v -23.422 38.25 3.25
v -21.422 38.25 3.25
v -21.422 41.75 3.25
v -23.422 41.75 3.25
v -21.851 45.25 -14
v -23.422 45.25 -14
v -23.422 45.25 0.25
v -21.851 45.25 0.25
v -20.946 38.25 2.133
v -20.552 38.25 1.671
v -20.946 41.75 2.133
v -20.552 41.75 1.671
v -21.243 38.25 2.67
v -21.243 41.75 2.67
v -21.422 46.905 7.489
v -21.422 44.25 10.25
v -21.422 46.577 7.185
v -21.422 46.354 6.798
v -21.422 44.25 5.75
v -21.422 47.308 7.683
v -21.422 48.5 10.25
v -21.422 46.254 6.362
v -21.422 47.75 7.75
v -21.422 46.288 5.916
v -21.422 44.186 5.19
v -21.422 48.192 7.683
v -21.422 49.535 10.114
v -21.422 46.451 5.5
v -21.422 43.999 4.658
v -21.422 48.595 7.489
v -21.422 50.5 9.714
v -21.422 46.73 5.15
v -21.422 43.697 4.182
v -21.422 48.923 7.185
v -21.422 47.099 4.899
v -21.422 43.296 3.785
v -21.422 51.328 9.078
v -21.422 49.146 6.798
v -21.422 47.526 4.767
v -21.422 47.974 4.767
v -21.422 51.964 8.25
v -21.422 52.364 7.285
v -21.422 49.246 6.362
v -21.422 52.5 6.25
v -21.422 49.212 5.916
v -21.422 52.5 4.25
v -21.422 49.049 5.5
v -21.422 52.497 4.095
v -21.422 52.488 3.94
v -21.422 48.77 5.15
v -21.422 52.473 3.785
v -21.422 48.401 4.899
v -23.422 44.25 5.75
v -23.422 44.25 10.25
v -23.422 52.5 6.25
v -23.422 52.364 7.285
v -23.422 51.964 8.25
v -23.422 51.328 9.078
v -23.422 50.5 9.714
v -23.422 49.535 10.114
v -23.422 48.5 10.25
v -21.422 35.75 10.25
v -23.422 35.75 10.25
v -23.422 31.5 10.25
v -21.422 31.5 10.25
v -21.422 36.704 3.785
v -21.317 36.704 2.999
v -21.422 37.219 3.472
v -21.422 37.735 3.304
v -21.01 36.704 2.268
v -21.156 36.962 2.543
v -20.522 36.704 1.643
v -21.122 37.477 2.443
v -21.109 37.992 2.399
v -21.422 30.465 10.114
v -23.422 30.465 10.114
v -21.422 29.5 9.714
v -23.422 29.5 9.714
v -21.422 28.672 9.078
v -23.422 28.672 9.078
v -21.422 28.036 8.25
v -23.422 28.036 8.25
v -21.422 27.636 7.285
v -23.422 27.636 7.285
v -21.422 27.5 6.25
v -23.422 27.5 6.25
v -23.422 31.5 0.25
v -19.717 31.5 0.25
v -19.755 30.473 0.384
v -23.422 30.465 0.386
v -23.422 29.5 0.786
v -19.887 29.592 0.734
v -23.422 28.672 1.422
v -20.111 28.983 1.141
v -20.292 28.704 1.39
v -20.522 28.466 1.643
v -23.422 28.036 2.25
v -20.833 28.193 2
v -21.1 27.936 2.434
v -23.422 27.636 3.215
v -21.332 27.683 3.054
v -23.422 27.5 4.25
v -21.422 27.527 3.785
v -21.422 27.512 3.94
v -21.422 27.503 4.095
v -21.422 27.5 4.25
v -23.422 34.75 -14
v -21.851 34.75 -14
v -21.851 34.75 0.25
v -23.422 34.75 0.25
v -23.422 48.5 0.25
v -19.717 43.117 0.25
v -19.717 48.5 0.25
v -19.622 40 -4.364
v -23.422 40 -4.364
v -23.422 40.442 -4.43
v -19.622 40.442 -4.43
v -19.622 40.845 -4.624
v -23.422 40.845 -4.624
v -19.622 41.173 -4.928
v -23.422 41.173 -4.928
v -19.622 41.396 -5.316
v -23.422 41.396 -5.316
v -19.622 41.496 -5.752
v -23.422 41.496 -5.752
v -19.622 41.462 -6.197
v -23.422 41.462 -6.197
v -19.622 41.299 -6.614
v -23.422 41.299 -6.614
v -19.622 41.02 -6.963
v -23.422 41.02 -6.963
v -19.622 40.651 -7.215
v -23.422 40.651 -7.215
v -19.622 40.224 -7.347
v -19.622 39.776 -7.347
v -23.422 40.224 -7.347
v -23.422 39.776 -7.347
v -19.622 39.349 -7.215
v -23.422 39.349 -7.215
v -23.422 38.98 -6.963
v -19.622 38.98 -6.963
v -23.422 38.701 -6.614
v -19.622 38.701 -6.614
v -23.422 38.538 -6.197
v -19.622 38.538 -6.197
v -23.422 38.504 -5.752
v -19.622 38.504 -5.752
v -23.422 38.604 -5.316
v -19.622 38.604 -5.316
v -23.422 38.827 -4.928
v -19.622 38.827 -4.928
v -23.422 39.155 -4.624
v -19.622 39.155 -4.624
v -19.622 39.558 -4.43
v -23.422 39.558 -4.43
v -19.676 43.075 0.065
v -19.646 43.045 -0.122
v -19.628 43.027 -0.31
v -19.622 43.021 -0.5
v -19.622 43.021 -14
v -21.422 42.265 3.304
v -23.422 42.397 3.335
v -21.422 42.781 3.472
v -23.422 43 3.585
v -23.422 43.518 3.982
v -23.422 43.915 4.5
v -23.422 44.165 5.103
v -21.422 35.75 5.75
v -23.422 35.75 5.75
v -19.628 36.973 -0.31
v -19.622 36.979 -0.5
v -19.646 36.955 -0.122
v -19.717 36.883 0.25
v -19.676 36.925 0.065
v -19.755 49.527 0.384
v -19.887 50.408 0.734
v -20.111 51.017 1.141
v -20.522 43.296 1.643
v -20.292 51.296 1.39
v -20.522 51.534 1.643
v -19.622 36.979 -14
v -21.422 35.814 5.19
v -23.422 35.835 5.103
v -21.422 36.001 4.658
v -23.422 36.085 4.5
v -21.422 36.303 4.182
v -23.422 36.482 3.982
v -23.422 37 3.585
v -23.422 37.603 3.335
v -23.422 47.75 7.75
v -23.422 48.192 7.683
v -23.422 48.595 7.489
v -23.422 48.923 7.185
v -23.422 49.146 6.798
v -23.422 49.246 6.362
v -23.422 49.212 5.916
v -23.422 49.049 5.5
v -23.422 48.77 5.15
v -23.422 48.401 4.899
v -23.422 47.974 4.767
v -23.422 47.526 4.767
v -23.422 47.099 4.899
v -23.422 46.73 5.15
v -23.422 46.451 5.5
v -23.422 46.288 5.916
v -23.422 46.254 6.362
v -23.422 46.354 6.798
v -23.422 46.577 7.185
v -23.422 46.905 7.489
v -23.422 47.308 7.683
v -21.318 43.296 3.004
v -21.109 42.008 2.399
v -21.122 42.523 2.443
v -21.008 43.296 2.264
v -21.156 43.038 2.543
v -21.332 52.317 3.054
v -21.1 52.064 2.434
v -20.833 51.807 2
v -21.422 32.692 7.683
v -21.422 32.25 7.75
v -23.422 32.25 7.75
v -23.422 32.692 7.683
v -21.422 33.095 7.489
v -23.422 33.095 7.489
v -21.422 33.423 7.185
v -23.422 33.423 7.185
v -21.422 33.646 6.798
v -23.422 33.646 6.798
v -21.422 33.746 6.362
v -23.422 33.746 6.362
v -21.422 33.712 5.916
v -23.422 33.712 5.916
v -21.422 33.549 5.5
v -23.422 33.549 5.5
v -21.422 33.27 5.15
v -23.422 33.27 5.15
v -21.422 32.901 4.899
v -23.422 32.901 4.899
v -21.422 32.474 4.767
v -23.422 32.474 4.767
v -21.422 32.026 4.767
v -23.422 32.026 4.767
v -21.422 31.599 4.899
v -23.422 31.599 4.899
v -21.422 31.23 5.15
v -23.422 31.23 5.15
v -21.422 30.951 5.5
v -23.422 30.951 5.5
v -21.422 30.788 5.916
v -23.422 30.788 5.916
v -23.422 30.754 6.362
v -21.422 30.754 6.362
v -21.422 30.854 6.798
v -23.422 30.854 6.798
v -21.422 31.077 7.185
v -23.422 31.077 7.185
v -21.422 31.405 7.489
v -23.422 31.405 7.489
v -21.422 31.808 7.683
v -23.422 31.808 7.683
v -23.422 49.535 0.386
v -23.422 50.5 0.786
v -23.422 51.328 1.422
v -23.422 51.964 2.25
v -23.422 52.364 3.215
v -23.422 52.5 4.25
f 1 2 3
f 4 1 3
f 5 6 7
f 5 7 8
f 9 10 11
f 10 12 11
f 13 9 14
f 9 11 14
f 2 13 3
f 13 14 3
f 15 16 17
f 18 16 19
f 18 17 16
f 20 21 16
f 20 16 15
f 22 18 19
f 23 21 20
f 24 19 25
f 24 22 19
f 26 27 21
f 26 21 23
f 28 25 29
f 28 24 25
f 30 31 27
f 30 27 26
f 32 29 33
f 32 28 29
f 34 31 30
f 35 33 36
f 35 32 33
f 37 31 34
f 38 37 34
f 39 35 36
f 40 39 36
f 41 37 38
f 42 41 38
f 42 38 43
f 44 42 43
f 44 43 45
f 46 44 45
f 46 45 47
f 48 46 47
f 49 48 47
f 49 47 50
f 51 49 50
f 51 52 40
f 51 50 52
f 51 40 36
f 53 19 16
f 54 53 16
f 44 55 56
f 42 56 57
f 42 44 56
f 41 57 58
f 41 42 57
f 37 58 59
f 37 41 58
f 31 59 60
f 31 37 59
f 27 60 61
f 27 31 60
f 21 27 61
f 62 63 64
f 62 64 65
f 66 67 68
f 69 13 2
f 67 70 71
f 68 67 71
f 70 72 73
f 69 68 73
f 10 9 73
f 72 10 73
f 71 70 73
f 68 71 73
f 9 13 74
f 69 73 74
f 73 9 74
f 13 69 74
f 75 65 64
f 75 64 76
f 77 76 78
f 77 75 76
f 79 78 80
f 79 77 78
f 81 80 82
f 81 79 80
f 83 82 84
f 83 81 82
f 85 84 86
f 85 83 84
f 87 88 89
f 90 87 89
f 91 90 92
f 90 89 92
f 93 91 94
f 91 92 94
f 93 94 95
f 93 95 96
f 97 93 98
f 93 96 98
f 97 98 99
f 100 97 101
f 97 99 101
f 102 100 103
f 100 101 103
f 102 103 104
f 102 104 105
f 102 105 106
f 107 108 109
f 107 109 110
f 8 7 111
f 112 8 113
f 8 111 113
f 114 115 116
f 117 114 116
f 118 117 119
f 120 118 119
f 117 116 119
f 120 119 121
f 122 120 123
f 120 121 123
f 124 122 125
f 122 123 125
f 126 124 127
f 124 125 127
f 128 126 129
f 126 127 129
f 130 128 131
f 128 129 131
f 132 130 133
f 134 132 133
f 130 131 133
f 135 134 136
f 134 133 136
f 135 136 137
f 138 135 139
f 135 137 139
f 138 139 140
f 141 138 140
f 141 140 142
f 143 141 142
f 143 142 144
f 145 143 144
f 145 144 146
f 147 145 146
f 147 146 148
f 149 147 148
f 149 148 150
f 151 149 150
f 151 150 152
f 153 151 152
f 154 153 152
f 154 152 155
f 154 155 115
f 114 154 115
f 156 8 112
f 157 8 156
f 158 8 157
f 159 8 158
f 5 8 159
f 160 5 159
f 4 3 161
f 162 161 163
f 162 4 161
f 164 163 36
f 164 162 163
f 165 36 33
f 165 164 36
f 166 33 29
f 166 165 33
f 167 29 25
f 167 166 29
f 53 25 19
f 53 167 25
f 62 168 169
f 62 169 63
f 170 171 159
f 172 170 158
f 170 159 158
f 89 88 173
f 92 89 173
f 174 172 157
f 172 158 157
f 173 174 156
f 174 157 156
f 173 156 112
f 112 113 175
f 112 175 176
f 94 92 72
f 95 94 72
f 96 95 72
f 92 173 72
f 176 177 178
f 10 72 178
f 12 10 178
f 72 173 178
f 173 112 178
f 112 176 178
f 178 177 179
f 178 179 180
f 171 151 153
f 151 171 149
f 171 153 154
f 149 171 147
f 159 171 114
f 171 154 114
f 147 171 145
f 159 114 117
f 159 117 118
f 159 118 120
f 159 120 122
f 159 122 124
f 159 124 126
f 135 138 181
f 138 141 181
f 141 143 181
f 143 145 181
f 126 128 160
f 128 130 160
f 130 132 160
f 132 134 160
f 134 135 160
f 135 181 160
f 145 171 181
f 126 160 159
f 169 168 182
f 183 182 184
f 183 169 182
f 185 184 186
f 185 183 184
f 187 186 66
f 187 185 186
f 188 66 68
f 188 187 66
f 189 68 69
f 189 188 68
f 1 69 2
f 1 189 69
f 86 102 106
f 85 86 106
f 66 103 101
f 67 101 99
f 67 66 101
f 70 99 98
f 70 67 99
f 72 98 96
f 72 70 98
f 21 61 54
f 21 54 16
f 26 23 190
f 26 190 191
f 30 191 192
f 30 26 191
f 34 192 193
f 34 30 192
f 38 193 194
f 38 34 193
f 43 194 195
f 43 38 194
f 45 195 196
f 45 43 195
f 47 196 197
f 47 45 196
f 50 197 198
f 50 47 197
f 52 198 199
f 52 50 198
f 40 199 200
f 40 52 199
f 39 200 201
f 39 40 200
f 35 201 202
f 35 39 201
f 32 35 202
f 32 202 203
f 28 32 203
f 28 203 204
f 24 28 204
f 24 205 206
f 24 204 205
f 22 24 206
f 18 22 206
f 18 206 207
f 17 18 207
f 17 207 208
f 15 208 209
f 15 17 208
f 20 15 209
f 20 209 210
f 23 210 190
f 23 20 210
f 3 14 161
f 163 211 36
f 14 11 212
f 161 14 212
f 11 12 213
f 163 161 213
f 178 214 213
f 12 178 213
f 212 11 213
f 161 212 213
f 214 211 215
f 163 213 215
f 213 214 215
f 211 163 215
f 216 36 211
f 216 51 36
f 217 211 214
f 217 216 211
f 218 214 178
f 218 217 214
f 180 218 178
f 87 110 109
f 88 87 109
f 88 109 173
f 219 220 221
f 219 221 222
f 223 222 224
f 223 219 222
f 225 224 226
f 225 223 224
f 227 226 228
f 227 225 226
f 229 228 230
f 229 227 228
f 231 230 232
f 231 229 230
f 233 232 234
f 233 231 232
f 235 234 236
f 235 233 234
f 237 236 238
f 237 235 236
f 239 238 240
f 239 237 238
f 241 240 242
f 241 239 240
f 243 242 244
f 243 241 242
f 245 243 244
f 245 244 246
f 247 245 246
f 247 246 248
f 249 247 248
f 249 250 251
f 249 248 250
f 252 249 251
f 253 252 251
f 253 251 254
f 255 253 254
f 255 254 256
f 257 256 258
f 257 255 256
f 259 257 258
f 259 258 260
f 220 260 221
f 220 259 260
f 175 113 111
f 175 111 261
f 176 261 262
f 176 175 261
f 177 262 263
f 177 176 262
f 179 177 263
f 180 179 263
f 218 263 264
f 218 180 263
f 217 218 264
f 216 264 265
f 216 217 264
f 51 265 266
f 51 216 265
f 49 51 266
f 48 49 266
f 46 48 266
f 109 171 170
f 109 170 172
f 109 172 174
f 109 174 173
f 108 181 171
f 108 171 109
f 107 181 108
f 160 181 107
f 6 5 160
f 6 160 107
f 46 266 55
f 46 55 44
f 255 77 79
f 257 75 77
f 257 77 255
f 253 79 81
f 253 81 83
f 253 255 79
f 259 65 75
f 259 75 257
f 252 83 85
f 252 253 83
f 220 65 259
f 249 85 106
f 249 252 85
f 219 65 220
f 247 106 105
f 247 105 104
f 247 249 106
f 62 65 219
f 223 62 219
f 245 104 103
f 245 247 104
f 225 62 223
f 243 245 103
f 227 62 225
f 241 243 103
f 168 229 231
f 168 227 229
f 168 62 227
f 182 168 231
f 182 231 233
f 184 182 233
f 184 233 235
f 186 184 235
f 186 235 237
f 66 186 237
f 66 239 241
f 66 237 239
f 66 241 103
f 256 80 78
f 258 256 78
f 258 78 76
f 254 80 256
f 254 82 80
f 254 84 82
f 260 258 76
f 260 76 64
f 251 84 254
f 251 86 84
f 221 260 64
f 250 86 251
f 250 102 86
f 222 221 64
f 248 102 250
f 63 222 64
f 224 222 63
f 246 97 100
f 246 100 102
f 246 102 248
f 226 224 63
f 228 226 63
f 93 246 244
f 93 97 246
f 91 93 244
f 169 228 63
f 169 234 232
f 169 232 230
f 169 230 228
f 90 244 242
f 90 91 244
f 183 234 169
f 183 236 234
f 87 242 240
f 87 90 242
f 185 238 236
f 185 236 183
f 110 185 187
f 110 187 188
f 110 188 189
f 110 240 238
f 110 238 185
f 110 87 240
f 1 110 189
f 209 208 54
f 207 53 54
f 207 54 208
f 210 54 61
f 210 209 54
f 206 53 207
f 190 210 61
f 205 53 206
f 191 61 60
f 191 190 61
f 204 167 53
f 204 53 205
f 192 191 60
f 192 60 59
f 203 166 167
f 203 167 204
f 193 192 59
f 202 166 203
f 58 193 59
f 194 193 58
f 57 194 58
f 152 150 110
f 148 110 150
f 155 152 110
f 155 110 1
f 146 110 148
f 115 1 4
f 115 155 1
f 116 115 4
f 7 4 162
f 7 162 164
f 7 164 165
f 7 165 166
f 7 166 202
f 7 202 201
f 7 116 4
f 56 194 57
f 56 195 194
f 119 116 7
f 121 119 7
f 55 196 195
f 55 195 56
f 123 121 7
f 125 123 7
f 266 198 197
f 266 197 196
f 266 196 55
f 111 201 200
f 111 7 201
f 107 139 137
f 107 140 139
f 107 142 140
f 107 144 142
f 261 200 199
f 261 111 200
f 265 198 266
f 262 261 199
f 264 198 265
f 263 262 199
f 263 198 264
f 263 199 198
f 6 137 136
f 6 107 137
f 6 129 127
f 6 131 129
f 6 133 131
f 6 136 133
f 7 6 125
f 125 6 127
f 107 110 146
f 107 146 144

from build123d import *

# Parameters (mm, degrees)
BOSS_EXTRUDE1_DEPTH      = 0.25
BOSS_EXTRUDE1_DEPTH_BACK = 14
SKETCH2_R                = 1.5
CUT_EXTRUDE1_DEPTH       = 14
SKETCH3_W                = 3.8
SKETCH3_H                = 25
BOSS_EXTRUDE2_DEPTH      = 10
CUT_EXTRUDE2_DEPTH       = 55.467329657
CUT_EXTRUDE2_DEPTH_BACK  = 55.467329657
SKETCH4_R                = 1.5
SKETCH4_W                = 7
SKETCH4_H                = 8.5
FILLET1_R                = 4
FILLET2_R                = 2.5
SKETCH5_W                = 8
SKETCH5_H                = 25
CUT_EXTRUDE3_DEPTH       = 1.8
FILLET3_R                = 3
FILLET4_R                = 3


with BuildPart() as part:
    # Sketch1 → Boss-Extrude1 (new, two sides: drawn at the far end of the back side and taken through both)
    with BuildSketch(Plane.XY.offset(-BOSS_EXTRUDE1_DEPTH_BACK)):
        Polygon((-23.42202285, 43.125), (-23.42202285, 45.25), (-21.850576241, 45.25), (-19.62202285, 43.021446609), (-19.62202285, 36.978553391), (-21.850576241, 34.75), (-23.42202285, 34.75), align=None)
    extrude(amount=BOSS_EXTRUDE1_DEPTH + BOSS_EXTRUDE1_DEPTH_BACK)

    # Sketch2 → Cut-Extrude1 (cut)
    with BuildSketch(Plane.ZY.offset(23.42202285)):
        with Locations((-5.863626805, 40)):
            Circle(SKETCH2_R)
    extrude(amount=-CUT_EXTRUDE1_DEPTH, mode=Mode.SUBTRACT)

    # Sketch3 → Boss-Extrude2 (add)
    with BuildSketch(Plane.XY.offset(0.25)):
        with Locations((-21.52202285, 40)):
            Rectangle(SKETCH3_W, SKETCH3_H)
    extrude(amount=BOSS_EXTRUDE2_DEPTH)

    # Sketch4 → Cut-Extrude2 (cut, two sides: drawn at the far end of the back side and taken through both)
    with BuildSketch(Plane.ZY.offset(23.42202285).offset(-CUT_EXTRUDE2_DEPTH_BACK)):
        with Locations((6.25, 47.75)):
            Circle(SKETCH4_R)
        with Locations((6.25, 32.25)):
            Circle(SKETCH4_R)
        with Locations((6.75, 40)):
            Rectangle(SKETCH4_W, SKETCH4_H)
    extrude(amount=CUT_EXTRUDE2_DEPTH + CUT_EXTRUDE2_DEPTH_BACK, mode=Mode.SUBTRACT)

    # Fillet1
    fillet1_edges = [part.edges().sort_by_distance(p)[0] for p in [
        (-21.52202285, 27.5, 0.25),
        (-21.52202285, 52.5, 0.25),
        (-21.52202285, 27.5, 10.25),
        (-21.52202285, 52.5, 10.25),
    ]]
    fillet(fillet1_edges, radius=FILLET1_R)

    # Fillet2
    fillet2_edges = [part.edges().sort_by_distance(p)[0] for p in [
        (-21.52202285, 35.75, 3.25),
        (-21.52202285, 44.25, 3.25),
    ]]
    fillet(fillet2_edges, radius=FILLET2_R)

    # Sketch5 → Cut-Extrude3 (cut)
    with BuildSketch(Plane(origin=(-19.62202285, 0, 0), x_dir=(0, 0, -1), z_dir=(1, 0, 0))):
        with Locations((-6.25, 40)):
            Rectangle(SKETCH5_W, SKETCH5_H)
    extrude(amount=-CUT_EXTRUDE3_DEPTH, mode=Mode.SUBTRACT)

    # Fillet3
    # the kernel refuses this fillet: 3 mm, written as the material it takes off along each edge
    with BuildSketch(Plane(origin=(-19.62202285, 58.837965158, 2.25), x_dir=(-1, 0, 0), z_dir=(0, -1, 0))) as fillet3_piece_1:
        with BuildLine():
            CenterArc((3, 2.749545417), FILLET3_R, 180, 66.421821522)
            Line((0, 2.749545417), (-0.06, 2.749545417))
            Line((-0.06, 2.749545417), (-0.06, 0))
            Line((-0.06, 0), (0, -0.06))
            ThreePointArc((0, -0.06), (0.9, -0.06), (1.776, -0.054990908))
            Line((1.776, -0.054990908), (1.8, 0))
        make_face()
    extrude(amount=37.675930315, mode=Mode.SUBTRACT)

    # Fillet4
    fillet4_edges = [part.edges().sort_by_distance(p)[0] for p in [
        (-21.42202285, 40, 2.25),
    ]]
    fillet(fillet4_edges, radius=FILLET4_R)


solid = part.part
